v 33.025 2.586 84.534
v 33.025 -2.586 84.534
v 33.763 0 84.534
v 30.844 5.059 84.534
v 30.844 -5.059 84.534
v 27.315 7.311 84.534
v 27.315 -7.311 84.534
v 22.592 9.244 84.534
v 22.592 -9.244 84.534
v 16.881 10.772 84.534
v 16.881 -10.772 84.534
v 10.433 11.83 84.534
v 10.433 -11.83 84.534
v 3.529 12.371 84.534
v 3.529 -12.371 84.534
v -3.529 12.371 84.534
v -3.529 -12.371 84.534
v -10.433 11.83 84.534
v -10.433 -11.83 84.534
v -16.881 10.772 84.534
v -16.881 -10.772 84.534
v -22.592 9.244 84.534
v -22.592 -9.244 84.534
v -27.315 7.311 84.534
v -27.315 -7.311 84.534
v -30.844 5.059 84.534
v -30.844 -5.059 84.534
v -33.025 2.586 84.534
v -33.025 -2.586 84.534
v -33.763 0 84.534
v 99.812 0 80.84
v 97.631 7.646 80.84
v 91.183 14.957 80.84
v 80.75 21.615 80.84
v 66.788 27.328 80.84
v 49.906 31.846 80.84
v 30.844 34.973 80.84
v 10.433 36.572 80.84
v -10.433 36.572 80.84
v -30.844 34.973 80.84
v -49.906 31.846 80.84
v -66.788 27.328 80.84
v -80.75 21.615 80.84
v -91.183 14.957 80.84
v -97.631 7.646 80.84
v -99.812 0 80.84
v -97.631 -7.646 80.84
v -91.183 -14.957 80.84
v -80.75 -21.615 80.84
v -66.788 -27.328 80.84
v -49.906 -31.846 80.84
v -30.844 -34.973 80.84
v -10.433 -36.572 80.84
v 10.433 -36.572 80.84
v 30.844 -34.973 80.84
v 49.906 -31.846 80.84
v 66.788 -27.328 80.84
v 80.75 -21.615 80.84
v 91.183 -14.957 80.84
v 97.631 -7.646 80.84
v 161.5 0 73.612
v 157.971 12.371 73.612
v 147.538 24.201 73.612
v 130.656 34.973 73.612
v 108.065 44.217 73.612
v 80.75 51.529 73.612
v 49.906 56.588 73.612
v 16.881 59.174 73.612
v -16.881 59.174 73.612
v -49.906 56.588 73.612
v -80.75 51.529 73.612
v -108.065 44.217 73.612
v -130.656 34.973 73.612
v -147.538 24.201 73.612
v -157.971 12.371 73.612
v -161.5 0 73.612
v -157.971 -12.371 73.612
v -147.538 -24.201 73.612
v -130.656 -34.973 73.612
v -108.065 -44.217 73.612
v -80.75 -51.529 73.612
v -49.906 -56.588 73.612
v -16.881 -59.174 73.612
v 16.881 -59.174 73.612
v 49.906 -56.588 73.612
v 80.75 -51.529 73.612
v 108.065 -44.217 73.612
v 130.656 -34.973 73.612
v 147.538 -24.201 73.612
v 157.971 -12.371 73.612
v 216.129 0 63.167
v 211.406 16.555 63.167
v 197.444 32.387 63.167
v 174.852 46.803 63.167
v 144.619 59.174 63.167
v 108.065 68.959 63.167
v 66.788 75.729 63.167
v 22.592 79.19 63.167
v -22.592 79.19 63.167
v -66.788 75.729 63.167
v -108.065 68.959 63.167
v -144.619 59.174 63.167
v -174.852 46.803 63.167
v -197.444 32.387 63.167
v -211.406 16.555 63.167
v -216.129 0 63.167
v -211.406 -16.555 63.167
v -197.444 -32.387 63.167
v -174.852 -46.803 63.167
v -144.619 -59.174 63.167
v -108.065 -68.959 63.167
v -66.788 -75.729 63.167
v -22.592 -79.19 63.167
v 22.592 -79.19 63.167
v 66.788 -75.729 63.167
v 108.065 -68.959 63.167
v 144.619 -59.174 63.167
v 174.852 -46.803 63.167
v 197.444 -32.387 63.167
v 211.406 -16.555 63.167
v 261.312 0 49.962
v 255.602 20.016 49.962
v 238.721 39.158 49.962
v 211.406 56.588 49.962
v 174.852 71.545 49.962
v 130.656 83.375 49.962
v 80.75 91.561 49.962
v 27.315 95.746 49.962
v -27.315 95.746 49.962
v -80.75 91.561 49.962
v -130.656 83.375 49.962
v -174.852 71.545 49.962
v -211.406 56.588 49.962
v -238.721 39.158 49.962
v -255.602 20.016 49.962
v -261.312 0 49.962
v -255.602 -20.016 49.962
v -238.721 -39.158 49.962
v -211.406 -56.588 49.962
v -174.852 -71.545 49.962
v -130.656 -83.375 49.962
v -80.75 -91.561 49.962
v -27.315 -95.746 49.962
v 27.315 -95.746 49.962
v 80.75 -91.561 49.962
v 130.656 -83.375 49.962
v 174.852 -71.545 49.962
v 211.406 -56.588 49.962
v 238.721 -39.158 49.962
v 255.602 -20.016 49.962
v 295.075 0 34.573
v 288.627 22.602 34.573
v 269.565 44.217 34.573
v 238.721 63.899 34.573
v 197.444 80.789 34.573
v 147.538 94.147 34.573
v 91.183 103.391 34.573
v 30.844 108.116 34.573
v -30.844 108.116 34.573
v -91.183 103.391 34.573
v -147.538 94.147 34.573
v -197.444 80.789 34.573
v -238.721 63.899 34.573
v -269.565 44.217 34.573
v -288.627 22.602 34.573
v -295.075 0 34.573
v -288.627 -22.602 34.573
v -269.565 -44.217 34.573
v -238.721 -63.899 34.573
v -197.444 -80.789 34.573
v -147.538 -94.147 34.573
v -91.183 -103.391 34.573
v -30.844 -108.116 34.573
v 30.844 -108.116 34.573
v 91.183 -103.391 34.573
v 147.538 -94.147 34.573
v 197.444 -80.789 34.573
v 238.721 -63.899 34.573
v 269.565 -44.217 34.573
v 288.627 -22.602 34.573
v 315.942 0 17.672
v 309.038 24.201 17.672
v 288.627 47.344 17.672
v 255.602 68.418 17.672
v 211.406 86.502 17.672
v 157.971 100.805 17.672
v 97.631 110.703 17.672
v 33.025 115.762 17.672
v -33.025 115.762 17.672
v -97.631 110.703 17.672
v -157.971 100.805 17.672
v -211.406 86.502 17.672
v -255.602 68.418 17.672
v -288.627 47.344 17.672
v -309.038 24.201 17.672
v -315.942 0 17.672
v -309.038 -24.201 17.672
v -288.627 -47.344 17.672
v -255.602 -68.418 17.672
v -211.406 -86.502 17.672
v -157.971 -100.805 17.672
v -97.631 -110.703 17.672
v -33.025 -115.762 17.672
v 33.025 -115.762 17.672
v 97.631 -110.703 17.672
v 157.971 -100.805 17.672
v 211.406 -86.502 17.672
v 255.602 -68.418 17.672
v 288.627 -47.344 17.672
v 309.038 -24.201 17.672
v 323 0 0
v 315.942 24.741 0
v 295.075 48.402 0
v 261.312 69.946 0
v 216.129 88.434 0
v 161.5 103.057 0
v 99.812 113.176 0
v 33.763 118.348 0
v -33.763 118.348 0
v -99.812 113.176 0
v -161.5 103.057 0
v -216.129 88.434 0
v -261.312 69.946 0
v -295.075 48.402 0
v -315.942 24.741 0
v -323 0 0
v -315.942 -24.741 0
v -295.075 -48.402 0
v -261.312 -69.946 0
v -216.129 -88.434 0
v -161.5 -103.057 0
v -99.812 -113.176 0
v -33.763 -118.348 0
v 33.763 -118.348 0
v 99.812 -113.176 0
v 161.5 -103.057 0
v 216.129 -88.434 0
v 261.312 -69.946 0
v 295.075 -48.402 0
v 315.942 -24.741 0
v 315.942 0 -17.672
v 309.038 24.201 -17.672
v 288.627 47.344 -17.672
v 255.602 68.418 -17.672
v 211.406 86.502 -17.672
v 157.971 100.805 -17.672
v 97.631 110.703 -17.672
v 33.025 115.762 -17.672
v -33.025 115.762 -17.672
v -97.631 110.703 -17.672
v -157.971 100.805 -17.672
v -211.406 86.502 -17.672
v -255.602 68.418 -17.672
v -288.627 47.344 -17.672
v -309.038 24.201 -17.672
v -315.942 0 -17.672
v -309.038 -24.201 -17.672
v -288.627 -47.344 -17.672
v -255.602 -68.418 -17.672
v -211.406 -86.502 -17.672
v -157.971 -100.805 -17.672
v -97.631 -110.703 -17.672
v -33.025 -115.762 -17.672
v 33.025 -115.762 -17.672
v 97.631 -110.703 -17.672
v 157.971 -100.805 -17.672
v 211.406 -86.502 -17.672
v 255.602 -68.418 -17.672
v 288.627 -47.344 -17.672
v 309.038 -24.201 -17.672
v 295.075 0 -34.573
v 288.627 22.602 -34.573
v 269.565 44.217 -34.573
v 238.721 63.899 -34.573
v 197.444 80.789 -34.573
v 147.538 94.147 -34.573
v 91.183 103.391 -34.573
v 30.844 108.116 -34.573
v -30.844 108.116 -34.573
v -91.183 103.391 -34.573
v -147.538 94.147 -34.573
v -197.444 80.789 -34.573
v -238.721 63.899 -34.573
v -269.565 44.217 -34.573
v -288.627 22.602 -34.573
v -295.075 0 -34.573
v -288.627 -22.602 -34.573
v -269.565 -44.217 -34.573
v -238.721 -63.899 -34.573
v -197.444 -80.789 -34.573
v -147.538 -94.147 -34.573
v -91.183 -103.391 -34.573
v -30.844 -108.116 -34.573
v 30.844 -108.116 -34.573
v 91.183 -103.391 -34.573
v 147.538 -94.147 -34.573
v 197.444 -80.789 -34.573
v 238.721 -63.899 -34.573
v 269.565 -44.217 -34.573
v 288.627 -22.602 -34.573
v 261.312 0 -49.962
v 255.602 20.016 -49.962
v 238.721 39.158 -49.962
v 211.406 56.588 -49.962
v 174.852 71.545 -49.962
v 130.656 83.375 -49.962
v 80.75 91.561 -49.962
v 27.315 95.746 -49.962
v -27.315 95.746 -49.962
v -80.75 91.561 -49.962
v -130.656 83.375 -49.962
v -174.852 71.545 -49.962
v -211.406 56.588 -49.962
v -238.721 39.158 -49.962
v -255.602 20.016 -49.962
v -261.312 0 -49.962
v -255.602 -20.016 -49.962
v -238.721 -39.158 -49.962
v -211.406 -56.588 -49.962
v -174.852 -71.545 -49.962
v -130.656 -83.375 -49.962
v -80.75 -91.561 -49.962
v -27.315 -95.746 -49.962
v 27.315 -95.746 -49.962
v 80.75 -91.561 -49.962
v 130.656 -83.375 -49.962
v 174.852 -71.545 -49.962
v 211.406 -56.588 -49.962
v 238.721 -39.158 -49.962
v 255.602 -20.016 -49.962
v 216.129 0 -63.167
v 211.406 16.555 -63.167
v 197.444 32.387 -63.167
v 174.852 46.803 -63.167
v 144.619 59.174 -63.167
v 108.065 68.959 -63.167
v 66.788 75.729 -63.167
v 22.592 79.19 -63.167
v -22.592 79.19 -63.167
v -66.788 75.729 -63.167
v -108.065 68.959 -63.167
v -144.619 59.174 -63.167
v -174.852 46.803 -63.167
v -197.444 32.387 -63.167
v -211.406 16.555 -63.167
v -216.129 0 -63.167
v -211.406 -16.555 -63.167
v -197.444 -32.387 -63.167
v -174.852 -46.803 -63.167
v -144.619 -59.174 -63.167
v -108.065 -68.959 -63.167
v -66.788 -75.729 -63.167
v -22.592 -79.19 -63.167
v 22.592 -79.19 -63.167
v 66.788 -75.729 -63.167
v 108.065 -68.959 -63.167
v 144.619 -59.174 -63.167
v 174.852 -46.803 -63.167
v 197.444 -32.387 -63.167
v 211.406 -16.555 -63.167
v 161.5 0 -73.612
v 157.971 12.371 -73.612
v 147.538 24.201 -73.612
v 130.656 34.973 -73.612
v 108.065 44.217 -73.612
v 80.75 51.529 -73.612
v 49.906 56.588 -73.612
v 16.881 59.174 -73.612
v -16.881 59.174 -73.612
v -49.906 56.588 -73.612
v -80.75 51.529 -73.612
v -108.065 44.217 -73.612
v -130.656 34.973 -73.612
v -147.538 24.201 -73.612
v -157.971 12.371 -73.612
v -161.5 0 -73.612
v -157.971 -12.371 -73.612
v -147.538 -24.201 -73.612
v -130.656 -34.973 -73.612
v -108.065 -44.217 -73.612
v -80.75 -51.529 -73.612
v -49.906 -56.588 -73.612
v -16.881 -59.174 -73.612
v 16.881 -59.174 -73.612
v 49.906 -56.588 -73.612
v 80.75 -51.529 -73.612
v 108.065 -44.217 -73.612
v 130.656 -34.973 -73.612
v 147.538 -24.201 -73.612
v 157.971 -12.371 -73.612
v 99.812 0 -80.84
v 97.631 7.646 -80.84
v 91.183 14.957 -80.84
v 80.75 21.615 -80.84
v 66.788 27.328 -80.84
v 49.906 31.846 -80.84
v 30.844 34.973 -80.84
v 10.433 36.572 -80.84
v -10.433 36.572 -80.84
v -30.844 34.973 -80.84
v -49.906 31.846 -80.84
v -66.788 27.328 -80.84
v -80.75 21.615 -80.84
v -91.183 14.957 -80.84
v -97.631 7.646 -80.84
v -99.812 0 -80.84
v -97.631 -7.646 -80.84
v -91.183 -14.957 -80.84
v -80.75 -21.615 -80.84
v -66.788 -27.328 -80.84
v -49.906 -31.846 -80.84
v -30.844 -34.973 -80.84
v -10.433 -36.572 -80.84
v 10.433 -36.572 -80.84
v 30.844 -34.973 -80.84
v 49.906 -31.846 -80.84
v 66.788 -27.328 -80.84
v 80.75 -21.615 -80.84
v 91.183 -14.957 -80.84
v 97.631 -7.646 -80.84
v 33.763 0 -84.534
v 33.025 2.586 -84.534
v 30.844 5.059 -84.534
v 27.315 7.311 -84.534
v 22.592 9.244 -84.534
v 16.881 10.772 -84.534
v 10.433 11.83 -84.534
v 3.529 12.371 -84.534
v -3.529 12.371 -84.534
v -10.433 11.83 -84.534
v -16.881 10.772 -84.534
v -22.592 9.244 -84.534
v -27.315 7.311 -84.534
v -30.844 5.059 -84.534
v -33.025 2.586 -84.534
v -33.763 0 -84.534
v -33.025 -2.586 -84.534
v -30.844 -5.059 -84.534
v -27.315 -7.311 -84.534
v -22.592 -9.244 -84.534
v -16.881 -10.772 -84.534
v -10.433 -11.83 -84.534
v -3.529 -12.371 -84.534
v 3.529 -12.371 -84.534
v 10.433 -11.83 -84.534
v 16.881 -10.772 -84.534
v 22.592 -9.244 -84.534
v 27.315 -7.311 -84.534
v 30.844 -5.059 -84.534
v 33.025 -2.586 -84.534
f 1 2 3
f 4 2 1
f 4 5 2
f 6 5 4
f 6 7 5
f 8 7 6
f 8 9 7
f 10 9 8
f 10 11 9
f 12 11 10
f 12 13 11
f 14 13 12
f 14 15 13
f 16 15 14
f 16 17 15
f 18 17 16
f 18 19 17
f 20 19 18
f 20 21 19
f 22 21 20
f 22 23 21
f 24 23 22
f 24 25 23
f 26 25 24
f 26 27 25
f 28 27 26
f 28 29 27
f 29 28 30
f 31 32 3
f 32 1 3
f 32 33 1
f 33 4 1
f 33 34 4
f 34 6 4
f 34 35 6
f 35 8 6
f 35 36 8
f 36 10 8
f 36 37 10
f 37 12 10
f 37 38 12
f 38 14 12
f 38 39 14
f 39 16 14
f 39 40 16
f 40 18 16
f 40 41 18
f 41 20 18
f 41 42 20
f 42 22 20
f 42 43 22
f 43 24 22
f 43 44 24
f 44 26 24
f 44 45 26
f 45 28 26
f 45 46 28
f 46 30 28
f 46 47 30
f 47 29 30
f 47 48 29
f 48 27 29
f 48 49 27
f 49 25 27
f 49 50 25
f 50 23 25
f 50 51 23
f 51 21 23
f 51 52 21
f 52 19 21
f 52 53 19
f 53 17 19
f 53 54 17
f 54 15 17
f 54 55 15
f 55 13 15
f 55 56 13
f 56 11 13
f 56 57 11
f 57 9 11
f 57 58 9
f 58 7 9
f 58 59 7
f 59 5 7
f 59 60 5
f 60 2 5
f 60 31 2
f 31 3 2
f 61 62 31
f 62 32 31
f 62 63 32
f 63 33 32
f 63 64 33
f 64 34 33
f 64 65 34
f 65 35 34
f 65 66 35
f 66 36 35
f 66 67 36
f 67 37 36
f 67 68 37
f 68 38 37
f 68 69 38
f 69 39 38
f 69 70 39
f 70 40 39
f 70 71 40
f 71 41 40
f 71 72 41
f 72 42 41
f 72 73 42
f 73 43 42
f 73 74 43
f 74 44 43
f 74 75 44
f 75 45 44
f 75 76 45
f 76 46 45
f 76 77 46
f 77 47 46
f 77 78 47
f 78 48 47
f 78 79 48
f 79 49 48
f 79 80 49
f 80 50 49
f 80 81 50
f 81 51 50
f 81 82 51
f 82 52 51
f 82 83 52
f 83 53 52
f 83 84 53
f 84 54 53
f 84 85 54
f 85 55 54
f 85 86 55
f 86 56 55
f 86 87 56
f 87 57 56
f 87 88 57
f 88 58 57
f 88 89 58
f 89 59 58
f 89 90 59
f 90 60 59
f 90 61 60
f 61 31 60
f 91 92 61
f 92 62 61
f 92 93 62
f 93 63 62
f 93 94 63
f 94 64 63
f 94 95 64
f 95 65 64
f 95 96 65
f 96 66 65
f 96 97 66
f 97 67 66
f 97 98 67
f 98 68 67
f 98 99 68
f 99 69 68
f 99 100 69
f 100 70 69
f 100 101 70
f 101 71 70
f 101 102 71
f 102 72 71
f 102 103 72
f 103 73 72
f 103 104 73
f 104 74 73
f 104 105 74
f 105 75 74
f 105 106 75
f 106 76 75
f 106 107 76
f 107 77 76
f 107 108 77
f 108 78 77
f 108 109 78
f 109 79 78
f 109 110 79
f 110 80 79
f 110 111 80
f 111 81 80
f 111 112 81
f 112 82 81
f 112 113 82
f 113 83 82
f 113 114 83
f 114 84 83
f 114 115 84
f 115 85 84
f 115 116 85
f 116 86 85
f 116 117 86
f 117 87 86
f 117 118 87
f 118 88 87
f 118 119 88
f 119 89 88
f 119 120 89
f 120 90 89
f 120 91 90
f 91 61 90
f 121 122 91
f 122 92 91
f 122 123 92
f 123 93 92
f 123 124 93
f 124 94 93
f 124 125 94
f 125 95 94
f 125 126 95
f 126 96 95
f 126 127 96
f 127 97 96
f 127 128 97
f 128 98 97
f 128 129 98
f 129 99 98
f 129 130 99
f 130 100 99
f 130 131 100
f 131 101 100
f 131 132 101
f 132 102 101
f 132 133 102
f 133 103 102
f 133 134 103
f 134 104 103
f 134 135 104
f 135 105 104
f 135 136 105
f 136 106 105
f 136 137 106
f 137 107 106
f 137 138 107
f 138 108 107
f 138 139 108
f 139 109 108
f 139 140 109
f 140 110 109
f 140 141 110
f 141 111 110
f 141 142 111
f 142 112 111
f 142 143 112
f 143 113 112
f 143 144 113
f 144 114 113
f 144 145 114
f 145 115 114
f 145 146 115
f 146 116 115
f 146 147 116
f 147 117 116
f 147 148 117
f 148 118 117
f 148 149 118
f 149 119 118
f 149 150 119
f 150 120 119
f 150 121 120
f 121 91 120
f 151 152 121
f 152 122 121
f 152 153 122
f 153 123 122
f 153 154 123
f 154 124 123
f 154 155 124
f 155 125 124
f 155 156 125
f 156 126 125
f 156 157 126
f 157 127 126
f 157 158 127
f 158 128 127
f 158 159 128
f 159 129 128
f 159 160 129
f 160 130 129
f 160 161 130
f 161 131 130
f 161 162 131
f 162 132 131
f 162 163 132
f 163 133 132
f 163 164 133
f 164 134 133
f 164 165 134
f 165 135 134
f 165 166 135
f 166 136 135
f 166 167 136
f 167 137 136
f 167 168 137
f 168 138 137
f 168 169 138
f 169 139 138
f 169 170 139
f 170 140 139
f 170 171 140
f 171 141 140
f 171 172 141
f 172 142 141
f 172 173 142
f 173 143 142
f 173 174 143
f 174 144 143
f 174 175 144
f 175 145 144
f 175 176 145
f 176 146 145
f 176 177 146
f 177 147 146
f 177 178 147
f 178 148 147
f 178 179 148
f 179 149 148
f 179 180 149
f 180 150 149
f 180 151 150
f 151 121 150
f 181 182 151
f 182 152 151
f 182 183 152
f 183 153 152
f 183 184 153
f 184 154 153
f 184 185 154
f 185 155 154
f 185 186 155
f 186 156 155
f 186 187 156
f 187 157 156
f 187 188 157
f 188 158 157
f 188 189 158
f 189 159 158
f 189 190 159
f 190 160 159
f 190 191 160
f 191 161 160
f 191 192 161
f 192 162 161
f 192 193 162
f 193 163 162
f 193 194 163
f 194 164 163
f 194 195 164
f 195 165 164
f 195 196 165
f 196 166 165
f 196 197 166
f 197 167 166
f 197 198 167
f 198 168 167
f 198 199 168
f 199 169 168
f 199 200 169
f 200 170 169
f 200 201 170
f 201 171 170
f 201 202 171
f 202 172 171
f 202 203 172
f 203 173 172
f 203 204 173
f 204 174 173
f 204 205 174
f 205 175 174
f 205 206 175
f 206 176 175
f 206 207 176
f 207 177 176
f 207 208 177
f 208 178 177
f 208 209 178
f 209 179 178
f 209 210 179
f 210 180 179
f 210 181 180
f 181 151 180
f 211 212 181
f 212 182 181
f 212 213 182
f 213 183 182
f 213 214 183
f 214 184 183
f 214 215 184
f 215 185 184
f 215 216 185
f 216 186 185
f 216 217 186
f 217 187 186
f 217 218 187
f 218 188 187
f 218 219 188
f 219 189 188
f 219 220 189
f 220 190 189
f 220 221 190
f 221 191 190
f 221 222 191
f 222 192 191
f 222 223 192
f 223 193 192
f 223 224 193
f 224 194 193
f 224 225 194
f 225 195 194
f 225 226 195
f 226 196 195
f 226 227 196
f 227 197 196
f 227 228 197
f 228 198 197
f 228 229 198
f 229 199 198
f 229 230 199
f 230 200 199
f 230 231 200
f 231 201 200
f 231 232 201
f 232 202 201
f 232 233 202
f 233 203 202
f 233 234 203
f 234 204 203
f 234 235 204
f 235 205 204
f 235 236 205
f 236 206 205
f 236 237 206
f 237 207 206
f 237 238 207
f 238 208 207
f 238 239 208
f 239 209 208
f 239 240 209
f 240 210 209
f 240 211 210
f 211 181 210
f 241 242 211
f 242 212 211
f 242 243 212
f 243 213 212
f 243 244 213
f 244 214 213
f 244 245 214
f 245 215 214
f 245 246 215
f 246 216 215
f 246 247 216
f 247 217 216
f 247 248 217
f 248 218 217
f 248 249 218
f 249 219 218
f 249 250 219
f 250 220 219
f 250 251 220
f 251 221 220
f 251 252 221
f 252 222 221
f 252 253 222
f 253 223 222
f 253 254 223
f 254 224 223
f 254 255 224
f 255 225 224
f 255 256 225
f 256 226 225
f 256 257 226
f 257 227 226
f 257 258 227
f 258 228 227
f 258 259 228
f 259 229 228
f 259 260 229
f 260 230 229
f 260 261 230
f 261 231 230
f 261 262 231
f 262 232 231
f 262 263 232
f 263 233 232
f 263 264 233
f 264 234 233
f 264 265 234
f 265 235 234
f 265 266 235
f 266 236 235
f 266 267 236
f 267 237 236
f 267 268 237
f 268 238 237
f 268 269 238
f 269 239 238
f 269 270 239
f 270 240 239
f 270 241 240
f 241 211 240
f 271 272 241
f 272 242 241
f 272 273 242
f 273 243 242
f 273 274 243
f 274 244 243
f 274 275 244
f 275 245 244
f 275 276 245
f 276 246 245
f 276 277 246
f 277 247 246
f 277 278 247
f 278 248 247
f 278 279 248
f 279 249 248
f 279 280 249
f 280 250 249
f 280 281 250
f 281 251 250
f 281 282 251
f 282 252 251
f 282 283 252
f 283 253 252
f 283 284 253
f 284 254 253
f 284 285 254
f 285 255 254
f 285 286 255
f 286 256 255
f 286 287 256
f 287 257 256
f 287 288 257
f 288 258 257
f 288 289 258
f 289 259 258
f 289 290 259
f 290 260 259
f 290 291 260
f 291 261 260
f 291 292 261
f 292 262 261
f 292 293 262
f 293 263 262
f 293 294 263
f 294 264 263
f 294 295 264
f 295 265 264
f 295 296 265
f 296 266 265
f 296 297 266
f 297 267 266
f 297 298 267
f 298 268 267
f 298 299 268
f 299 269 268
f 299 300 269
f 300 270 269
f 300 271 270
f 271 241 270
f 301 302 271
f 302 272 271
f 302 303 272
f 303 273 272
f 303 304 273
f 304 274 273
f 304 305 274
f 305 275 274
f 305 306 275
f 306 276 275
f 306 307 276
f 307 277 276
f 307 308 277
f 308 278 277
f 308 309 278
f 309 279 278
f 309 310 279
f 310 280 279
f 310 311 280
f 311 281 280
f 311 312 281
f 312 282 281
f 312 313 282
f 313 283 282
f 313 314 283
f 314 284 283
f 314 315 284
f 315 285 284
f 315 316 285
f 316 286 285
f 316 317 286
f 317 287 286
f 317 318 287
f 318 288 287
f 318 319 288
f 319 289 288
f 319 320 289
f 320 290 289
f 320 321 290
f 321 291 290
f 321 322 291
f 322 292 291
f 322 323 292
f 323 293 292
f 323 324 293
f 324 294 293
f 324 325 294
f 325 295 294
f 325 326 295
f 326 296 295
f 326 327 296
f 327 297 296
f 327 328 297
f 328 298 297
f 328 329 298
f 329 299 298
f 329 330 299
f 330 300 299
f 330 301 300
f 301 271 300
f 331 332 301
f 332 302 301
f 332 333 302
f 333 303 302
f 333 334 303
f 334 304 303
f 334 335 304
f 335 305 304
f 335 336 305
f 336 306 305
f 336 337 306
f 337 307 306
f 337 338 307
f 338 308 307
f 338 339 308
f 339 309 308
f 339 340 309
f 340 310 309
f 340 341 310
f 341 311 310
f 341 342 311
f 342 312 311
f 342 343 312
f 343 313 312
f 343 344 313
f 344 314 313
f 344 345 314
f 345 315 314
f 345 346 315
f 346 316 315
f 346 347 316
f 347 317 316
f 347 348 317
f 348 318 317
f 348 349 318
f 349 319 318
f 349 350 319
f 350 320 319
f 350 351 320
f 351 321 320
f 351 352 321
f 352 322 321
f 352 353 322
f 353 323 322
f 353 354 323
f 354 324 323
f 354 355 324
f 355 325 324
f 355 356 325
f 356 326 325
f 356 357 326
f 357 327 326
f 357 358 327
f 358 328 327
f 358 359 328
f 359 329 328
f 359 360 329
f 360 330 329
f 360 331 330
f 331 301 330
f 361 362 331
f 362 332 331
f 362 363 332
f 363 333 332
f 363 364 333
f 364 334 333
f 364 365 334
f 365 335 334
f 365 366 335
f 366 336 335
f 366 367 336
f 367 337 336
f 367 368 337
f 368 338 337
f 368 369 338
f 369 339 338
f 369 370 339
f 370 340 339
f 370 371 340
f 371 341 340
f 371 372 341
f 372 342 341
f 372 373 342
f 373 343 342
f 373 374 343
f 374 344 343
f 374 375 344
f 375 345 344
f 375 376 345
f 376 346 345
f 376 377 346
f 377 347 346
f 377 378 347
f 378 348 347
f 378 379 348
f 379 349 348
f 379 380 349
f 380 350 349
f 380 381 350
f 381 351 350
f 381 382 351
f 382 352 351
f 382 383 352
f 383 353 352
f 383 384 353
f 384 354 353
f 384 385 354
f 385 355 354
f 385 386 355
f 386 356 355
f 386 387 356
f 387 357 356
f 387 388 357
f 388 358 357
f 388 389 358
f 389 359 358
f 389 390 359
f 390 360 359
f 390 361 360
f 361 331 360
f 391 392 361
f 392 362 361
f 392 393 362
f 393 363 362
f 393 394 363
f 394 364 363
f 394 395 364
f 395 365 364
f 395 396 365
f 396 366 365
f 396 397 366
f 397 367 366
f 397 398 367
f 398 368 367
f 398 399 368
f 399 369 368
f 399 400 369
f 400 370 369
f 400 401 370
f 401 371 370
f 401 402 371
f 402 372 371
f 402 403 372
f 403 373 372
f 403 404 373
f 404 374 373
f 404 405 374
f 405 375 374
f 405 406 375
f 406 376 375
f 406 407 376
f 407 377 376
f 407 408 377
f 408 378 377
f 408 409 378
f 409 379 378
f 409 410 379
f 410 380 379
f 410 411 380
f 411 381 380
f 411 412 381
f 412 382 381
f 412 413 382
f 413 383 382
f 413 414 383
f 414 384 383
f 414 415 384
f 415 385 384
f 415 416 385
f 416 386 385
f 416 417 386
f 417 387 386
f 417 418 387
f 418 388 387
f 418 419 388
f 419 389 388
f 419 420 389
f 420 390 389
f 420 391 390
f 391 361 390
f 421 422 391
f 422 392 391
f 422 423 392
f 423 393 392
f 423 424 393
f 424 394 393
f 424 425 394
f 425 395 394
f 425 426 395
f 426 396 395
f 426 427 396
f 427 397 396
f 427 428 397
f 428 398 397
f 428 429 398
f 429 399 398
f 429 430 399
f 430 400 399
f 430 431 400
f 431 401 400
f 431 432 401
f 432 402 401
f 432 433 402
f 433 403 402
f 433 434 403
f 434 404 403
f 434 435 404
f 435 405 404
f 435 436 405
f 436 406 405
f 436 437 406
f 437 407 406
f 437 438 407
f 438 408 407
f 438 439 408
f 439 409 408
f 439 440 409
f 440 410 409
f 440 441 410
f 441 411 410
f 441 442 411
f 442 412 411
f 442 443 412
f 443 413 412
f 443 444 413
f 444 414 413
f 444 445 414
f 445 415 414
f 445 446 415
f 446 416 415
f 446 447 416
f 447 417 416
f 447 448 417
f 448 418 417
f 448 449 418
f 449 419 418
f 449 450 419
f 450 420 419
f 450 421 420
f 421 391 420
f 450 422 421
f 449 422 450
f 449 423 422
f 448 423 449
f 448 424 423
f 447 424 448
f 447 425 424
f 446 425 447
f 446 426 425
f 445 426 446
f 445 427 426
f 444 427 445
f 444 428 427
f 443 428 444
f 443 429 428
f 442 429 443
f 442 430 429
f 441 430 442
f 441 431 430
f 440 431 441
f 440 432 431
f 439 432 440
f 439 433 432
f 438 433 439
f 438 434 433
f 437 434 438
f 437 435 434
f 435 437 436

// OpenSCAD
// Generated by SolidPython 1.0.1 on 2020-07-29 00:46:53


scale(v = [19, 7, 5]) {
	sphere(r = 17);
}
/***********************************************
*********      SolidPython code:      **********
************************************************
 
# import packages: SolidPython
from solid import *
from solid.utils import *
from itertools import chain, combinations, permutations


class Resize:

    def __init__(self, scad_file):
        self.scad_file = scad_file
        #self.scad_file = import_scad(scad_file)
        # cone/cylinder param:
        self.r1 = 0
        self.r2 = 0
        self.h = 0
        # rectangular prism param:
        self.w = 0
        self.l = 0
        # ellipse param:
        self.r = 0

    # import OpenScad code (file name corresponds to shape)


    # classify shape + parameters
    def assign(self, param1, param2, param3):
        if self.scad_file == 'cone.scad':
            self.r1 = param1
            self.r2 = param2
            self.h = param3
        elif self.scad_file == 'cylinder.scad':
            self.r1 = param1
            self.r2 = param2
            self.h = param3
        elif self.scad_file == 'rectangularPrism.scad':
            self.h = param1
            self.l = param2
            self.w = param3
        else:
            self.r = param1
            self.h = param2

    # resize parameters
    def iterate(self):
        x = range(3, 20, 2)
        i = 1
        if self.scad_file == 'cone.scad':
            tempList = list(permutations(x, 2))
            for temp in tempList:
                param1 = temp[0]
                param2 = temp[1]
                filepath = 'produced_scad_files/' + 'cone' + str(param1) + '_' + str(param2) + '_' + '.scad'
                scad_render_to_file(cylinder(h=param1, r1=param2, r2=0), filepath)

        elif self.scad_file == 'cylinder.scad':
            tempList = list(permutations(x, 3))
            for temp in tempList:
                param1 = temp[0]
                param2 = temp[1]
                filepath = 'produced_scad_files/' + 'cylinder' + str(param1) + '_' + str(param2) + '_' + '.scad'
                scad_render_to_file(cylinder(h=param1, r1=param2, r2=param2), filepath)

        elif self.scad_file == 'rectangularPrism.scad':
            tempList = list(permutations(x, 3))
            for temp in tempList:
                param1 = temp[0]
                param2 = temp[1]
                param3 = temp[2]
                filepath = 'produced_scad_files/' + 'rectangularPrism' + str(param1) + '_' + str(param2) + '_' + str(
                    param3) + '.scad'
                scad_render_to_file(cube(size=(param1, param2, param3)), filepath)

        elif self.scad_file == 'ellipse.scad':
            tempList = list(permutations(x, 4))
            for temp in tempList:
                param1 = temp[0]
                param2 = temp[1]
                param3 = temp[2]
                param4 = temp[3]
                filepath = 'produced_scad_files/' + 'ellipse' + str(param1) + '_' + str(param2) + '_' + str(param3) + '_' + str(param4) + '.scad'
                scad_render_to_file(scale([param1, param2, param3])(sphere(r=param4)), filepath)

    def render_to_scadfile(self):
        scad_render_to_file(scad, 'example.scad') 
 
************************************************/
